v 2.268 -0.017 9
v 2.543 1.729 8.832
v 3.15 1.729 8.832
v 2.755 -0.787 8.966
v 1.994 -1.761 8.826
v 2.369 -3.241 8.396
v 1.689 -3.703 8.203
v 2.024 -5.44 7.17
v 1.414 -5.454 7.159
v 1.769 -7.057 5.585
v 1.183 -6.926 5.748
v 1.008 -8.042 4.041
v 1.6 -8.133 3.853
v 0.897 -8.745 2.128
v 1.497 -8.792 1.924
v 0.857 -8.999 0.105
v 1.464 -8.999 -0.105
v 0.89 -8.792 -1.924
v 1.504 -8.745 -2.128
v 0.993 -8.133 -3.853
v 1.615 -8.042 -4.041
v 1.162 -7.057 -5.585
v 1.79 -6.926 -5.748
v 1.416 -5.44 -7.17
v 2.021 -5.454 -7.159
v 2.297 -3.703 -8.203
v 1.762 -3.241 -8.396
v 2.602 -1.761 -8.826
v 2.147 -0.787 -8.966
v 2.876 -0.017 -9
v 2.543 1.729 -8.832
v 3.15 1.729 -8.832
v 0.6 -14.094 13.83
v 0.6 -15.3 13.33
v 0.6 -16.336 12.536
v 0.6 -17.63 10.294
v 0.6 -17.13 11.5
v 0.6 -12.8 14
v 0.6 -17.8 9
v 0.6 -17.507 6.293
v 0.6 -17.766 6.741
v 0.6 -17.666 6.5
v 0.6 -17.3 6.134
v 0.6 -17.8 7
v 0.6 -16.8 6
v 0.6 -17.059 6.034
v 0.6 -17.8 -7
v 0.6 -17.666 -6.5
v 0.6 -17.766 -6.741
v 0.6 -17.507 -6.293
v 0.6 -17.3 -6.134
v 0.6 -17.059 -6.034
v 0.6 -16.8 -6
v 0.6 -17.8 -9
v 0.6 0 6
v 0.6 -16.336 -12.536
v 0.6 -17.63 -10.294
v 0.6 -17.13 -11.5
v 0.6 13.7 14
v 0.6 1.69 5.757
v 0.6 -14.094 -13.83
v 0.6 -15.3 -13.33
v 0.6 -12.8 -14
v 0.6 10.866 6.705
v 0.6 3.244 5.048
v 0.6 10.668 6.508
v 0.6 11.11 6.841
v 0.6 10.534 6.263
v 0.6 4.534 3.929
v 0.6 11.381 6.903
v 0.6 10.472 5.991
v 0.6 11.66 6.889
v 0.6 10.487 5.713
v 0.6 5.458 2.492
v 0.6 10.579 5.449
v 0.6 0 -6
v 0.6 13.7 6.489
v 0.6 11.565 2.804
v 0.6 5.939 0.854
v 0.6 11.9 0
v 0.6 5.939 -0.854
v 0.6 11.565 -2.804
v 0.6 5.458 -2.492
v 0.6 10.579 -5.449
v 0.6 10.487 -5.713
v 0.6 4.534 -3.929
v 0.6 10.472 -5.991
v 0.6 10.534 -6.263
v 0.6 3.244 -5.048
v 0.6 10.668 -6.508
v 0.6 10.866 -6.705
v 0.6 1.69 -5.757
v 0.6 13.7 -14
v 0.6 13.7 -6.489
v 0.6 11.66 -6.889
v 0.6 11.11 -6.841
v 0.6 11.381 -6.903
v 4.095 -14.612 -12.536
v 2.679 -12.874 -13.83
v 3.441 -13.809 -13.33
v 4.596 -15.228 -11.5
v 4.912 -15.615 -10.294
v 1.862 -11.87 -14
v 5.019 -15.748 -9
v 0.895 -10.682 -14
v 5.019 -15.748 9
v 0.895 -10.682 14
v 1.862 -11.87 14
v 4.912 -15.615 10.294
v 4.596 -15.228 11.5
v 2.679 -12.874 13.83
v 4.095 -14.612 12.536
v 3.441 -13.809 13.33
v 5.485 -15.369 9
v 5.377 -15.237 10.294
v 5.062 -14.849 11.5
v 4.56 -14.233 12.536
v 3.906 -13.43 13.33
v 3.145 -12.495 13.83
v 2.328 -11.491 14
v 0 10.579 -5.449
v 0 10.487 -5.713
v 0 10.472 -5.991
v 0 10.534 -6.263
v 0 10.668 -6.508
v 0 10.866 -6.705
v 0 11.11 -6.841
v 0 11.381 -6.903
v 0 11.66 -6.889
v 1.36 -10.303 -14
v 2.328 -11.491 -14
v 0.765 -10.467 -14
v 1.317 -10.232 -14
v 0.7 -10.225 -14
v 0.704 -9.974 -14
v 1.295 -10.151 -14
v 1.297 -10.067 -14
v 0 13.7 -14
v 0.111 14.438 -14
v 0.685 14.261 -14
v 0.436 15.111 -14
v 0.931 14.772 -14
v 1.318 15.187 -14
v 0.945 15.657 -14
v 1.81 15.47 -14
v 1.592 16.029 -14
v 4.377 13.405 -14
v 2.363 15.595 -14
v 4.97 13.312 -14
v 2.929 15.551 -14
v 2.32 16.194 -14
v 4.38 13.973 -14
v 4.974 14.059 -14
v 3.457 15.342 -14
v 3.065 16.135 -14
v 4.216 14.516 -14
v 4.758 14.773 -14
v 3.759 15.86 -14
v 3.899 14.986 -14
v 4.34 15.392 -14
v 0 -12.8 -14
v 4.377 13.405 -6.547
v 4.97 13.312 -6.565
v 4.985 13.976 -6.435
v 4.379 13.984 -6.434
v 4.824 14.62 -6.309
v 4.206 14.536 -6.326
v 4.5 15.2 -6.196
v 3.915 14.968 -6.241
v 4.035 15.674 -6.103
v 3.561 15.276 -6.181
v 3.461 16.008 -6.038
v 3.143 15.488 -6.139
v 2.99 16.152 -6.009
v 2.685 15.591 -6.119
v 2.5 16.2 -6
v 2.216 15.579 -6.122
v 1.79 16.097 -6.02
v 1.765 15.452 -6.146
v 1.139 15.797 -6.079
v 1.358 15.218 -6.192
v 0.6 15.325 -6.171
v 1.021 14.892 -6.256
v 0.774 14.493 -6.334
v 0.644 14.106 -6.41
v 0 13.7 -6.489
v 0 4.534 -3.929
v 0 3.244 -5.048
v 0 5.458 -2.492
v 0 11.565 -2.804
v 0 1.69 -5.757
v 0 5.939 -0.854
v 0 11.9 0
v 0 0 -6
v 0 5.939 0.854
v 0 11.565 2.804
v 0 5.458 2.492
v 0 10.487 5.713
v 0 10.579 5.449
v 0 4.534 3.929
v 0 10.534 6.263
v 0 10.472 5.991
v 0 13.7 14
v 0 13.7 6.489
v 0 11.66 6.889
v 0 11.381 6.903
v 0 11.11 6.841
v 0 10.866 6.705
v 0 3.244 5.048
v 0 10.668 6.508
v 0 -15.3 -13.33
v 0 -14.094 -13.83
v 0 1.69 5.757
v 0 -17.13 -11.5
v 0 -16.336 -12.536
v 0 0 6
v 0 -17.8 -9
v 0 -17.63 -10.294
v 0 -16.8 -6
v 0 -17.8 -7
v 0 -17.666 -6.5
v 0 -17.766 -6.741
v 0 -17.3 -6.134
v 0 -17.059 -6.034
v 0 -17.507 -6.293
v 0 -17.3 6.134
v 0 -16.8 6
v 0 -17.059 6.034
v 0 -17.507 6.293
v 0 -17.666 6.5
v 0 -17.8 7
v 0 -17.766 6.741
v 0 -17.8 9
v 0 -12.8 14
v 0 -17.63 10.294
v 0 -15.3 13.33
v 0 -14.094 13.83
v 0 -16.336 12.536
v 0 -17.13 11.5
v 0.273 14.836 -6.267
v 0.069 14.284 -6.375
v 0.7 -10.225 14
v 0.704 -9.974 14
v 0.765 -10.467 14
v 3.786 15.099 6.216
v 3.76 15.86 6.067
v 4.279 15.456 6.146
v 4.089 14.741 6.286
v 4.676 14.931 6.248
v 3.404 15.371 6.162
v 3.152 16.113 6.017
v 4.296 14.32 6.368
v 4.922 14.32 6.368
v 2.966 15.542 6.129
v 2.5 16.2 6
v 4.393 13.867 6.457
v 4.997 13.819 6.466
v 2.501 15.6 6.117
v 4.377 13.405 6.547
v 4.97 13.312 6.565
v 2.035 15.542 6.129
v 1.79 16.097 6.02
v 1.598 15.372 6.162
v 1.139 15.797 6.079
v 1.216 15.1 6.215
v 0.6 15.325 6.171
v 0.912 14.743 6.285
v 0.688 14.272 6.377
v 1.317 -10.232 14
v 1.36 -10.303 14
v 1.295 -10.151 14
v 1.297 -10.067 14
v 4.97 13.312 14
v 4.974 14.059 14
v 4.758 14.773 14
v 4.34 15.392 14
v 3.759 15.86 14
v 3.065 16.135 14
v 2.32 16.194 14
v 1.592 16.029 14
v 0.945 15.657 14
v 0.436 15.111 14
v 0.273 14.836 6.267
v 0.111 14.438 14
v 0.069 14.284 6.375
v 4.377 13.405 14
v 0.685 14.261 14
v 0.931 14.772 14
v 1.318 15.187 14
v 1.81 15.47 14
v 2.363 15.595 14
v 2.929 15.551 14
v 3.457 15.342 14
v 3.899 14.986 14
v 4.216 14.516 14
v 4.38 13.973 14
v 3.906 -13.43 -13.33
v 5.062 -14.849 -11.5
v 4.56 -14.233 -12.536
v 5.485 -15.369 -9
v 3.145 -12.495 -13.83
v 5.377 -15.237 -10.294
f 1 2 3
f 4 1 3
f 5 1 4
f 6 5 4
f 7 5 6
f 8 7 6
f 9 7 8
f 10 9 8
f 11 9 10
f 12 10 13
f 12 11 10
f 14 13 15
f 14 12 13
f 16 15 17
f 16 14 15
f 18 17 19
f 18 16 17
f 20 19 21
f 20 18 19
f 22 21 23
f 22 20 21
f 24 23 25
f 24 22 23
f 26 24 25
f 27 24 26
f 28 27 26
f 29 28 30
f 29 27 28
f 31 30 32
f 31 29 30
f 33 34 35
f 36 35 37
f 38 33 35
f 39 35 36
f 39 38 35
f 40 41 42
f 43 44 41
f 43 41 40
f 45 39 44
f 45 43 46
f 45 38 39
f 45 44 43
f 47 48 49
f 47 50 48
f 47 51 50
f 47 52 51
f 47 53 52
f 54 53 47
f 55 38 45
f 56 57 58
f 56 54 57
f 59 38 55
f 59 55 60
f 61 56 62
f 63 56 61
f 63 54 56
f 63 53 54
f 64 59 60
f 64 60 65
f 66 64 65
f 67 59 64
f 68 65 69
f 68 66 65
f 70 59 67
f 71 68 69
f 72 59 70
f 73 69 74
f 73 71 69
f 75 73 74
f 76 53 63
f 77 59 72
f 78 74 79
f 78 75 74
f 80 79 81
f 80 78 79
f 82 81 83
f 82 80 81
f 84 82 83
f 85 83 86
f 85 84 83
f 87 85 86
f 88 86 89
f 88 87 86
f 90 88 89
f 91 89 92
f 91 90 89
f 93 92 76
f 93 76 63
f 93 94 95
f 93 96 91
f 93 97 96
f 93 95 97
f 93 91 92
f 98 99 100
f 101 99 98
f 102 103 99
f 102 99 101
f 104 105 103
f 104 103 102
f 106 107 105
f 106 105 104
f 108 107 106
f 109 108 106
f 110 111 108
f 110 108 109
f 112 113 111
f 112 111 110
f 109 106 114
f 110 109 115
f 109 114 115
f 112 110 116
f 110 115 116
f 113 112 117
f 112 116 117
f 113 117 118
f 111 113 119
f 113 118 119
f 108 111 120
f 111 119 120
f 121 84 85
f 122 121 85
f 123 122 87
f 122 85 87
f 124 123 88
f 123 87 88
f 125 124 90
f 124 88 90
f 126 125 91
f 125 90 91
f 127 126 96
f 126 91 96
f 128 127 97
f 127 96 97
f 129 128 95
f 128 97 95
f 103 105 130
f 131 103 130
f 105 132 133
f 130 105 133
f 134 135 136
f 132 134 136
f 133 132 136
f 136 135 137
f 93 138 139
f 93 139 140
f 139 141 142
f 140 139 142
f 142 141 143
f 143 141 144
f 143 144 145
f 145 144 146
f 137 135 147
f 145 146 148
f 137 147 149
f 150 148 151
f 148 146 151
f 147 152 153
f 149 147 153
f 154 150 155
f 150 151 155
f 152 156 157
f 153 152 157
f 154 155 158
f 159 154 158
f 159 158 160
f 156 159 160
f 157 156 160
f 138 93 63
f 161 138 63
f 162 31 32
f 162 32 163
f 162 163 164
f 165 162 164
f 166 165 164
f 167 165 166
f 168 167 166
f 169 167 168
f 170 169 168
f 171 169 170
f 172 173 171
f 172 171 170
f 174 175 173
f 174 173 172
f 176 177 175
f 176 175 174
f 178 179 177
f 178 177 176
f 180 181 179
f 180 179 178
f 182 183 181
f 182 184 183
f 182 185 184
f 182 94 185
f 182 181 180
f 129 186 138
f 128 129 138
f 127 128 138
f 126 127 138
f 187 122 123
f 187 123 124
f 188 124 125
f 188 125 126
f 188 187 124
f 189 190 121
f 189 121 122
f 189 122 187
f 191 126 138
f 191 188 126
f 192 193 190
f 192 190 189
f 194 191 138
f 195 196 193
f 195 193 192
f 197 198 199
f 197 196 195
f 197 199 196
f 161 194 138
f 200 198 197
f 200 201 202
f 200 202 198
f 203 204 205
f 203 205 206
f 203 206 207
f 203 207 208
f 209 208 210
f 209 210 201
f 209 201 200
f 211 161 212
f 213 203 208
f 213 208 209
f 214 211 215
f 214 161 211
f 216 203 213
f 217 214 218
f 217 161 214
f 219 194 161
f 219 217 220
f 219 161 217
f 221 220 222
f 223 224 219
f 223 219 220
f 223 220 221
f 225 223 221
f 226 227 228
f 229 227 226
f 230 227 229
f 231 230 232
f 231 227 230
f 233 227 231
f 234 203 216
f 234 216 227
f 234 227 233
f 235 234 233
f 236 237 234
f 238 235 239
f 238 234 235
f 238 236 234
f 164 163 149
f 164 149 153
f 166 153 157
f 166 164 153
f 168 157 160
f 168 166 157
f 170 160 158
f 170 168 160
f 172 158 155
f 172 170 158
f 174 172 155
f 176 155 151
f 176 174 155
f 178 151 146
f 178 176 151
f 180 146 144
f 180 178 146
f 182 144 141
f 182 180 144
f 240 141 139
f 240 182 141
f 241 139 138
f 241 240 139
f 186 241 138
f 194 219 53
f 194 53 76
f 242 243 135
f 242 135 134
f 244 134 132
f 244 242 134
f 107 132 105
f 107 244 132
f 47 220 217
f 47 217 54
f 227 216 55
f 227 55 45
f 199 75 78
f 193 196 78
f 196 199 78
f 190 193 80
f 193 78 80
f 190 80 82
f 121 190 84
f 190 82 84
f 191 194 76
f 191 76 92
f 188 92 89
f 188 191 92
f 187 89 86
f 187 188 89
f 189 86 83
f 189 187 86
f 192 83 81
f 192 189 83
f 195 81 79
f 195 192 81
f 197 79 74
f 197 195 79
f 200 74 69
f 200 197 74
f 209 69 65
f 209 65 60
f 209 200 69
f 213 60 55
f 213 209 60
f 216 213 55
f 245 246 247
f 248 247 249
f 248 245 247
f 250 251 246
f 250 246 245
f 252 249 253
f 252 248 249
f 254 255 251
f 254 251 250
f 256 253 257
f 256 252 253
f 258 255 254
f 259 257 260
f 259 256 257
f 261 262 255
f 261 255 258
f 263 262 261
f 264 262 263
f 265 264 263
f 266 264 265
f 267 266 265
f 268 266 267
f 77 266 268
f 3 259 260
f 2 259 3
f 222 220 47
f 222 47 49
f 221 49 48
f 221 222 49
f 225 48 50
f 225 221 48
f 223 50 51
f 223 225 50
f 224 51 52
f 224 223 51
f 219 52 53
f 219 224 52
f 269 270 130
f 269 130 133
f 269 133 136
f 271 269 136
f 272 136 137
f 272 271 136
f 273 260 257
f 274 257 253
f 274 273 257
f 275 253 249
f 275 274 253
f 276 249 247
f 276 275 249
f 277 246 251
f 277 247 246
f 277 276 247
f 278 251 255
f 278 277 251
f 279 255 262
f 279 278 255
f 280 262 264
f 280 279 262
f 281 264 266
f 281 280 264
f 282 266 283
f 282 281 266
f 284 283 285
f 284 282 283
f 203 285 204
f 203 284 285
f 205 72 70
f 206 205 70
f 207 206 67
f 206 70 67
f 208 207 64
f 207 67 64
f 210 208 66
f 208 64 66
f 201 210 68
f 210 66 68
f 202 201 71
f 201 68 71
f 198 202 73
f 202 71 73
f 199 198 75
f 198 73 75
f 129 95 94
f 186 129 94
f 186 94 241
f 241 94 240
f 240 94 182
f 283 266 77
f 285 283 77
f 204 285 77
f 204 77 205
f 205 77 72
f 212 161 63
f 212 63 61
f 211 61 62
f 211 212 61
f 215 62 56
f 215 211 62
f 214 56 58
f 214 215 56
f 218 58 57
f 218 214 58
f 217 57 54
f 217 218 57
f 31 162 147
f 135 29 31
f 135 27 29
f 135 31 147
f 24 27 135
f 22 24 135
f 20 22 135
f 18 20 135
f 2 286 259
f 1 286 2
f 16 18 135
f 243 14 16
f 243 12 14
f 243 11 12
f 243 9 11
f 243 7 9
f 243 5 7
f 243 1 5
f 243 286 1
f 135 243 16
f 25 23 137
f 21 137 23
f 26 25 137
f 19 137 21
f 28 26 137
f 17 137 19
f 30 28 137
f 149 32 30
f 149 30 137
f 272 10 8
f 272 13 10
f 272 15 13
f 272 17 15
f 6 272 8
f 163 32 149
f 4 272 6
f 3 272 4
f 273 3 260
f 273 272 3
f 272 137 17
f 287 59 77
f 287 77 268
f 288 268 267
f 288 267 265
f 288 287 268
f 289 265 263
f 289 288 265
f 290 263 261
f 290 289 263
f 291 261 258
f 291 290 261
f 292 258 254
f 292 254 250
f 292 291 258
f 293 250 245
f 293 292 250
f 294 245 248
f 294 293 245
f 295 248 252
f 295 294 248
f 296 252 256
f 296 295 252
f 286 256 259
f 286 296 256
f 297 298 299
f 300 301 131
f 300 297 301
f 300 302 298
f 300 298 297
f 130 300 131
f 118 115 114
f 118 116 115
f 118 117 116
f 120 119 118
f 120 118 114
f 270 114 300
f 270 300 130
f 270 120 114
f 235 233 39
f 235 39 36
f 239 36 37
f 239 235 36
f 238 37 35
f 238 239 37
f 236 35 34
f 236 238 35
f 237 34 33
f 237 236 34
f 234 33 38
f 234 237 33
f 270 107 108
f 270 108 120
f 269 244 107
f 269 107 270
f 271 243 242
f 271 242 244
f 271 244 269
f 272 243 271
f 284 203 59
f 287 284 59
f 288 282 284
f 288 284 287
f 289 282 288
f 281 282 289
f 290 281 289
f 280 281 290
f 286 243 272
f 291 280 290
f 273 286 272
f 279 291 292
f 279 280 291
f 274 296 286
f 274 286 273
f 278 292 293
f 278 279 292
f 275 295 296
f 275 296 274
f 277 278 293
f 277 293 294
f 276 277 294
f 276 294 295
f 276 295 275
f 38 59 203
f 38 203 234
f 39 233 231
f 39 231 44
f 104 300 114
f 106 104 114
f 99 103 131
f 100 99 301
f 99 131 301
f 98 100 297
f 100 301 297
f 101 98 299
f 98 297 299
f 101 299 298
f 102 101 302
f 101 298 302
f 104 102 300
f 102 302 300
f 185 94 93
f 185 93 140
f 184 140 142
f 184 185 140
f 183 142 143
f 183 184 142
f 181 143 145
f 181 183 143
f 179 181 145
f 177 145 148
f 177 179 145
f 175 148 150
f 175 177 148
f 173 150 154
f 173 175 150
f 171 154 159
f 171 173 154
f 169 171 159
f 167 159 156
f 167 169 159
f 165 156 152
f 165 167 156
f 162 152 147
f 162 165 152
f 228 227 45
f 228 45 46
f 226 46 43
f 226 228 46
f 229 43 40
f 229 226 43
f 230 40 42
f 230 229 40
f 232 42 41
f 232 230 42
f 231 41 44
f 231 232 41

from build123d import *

# Parameters (mm, degrees)
BOSS_EXTRUDE1_DEPTH      = 14
BOSS_EXTRUDE1_DEPTH_BACK = 14
CUT_EXTRUDE1_DEPTH       = 0.6
CUT_EXTRUDE2_DEPTH       = 5.4
CUT_EXTRUDE3_DEPTH       = 5.4
CUT_EXTRUDE4_DEPTH       = 0.6
CUT_EXTRUDE5_DEPTH       = 0.6
CUT_EXTRUDE6_DEPTH       = 0.6
CUT_EXTRUDE7_DEPTH       = 0.6
CUT_EXTRUDE8_DEPTH       = 1.2
CUT_EXTRUDE8_DEPTH_BACK  = 1.2


with BuildPart() as part:
    # Sketch1 → Boss-Extrude1 (new, two sides: drawn at the far end of the back side and taken through both)
    with BuildSketch(Plane.XY.offset(-BOSS_EXTRUDE1_DEPTH_BACK)):
        with BuildLine():
            Line((0, 13.7), (0, -17.8))
            Line((0, -17.8), (0.6, -17.8))
            Line((0.6, -17.8), (0.6, 13.7))
            ThreePointArc((0.6, 13.7), (2.647893792, 15.594235314), (4.376976238, 13.405109849))
            Line((4.376976238, 13.405109849), (0.703859087, -9.974286111))
            ThreePointArc((0.703859087, -9.974286111), (0.724075997, -10.348603801), (0.895029628, -10.682216319))
            Line((0.895029628, -10.682216319), (5.036277977, -15.76853009))
            Line((5.036277977, -15.76853009), (5.501560288, -15.389699824))
            Line((5.501560288, -15.389699824), (1.360311939, -10.303386053))
            ThreePointArc((1.360311939, -10.303386053), (1.303327395, -10.19218188), (1.296588425, -10.067409316))
            Line((1.296588425, -10.067409316), (4.969705577, 13.311986643))
            ThreePointArc((4.969705577, 13.311986643), (2.694597095, 16.192414887), (0, 13.7))
        make_face()
    extrude(amount=BOSS_EXTRUDE1_DEPTH + BOSS_EXTRUDE1_DEPTH_BACK)

    # Sketch2 → Cut-Extrude1 (cut)
    with BuildSketch(Plane(origin=(0, 0, 0), x_dir=(0, 0, -1), z_dir=(1, 0, 0))):
        with BuildLine():
            Line((-6, 0), (-6, -17.8))
            Line((-6, -17.8), (6, -17.8))
            Line((6, -17.8), (6, 0))
            ThreePointArc((6, 0), (0, 6), (-6, 0))
        make_face()
    extrude(amount=CUT_EXTRUDE1_DEPTH, mode=Mode.SUBTRACT)

    # Sketch3 → Cut-Extrude2 (cut)
    with BuildSketch(Plane(origin=(0.6, 0, 0), x_dir=(0, 0, -1), z_dir=(1, 0, 0))):
        with BuildLine():
            Line((8.832410113, 1.728736995), (6, 16.2))
            Line((6, 16.2), (-6, 16.2))
            Line((-6, 16.2), (-8.832410113, 1.728736995))
            ThreePointArc((-8.832410113, 1.728736995), (0, -9), (8.832410113, 1.728736995))
        make_face()
    extrude(amount=CUT_EXTRUDE2_DEPTH, mode=Mode.SUBTRACT)

    # Sketch4 → Cut-Extrude3 (cut)
    with BuildSketch(Plane(origin=(0.6, 0, 0), x_dir=(0, 0, -1), z_dir=(1, 0, 0))):
        with BuildLine():
            Line((6.88858316, 11.660078132), (6, 16.2))
            Line((6, 16.2), (-6, 16.2))
            Line((-6, 16.2), (-6.88858316, 11.660078132))
            ThreePointArc((-6.88858316, 11.660078132), (-6.507772079, 10.668422424), (-5.449281397, 10.579004313))
            ThreePointArc((-5.449281397, 10.579004313), (2.9e-08, 11.9), (5.449281448, 10.579004287))
            ThreePointArc((5.449281448, 10.579004287), (6.507772102, 10.668422441), (6.88858316, 11.660078132))
        make_face()
    extrude(amount=-CUT_EXTRUDE3_DEPTH, mode=Mode.SUBTRACT)

    # Sketch5 → Cut-Extrude4 (cut)
    with BuildSketch(Plane(origin=(0, 0, 0), x_dir=(0, 0, -1), z_dir=(1, 0, 0))):
        with BuildLine():
            Line((-14, -17.8), (-9, -17.8))
            ThreePointArc((-9, -17.8), (-12.535533906, -16.335533906), (-14, -12.8))
            Line((-14, -12.8), (-14, -17.8))
        make_face()
    extrude(amount=CUT_EXTRUDE4_DEPTH, mode=Mode.SUBTRACT)

    # Sketch6 → Cut-Extrude5 (cut)
    with BuildSketch(Plane(origin=(0, 0, 0), x_dir=(0, 0, -1), z_dir=(1, 0, 0))):
        with BuildLine():
            Line((9, -17.8), (14, -17.8))
            Line((14, -17.8), (14, -12.8))
            ThreePointArc((14, -12.8), (12.535533906, -16.335533906), (9, -17.8))
        make_face()
    extrude(amount=CUT_EXTRUDE5_DEPTH, mode=Mode.SUBTRACT)

    # Sketch7 → Cut-Extrude6 (cut)
    with BuildSketch(Plane(origin=(0, 0, 0), x_dir=(0, 0, -1), z_dir=(1, 0, 0))):
        with BuildLine():
            Line((6, -17.8), (7, -17.8))
            ThreePointArc((7, -17.8), (6.292893219, -17.507106781), (6, -16.8))
            Line((6, -16.8), (6, -17.8))
        make_face()
    extrude(amount=CUT_EXTRUDE6_DEPTH, mode=Mode.SUBTRACT)

    # Sketch8 → Cut-Extrude7 (cut)
    with BuildSketch(Plane(origin=(0, 0, 0), x_dir=(0, 0, -1), z_dir=(1, 0, 0))):
        with BuildLine():
            Line((-7, -17.8), (-6, -17.8))
            Line((-6, -17.8), (-6, -16.8))
            ThreePointArc((-6, -16.8), (-6.292893219, -17.507106781), (-7, -17.8))
        make_face()
    extrude(amount=CUT_EXTRUDE7_DEPTH, mode=Mode.SUBTRACT)

    # Sketch9 → Cut-Extrude8 (cut, two sides: drawn at the far end of the back side and taken through both)
    with BuildSketch(Plane(origin=(-4.226709045, -3.441362969, 0), x_dir=(0, 0, -1), z_dir=(0.7754705184321754, 0.6313837779374231, 0)).offset(-CUT_EXTRUDE8_DEPTH_BACK)):
        with BuildLine():
            Line((-14, -10.380851015), (-19, -10.380851015))
            Line((-19, -10.380851015), (-19, -20.380851015))
            Line((-19, -20.380851015), (19, -20.380851015))
            Line((19, -20.380851015), (19, -10.380851015))
            Line((19, -10.380851015), (14, -10.380851015))
            ThreePointArc((14, -10.380851015), (12.535533906, -13.916384921), (9, -15.380851015))
            Line((9, -15.380851015), (-9, -15.380851015))
            ThreePointArc((-9, -15.380851015), (-12.535533906, -13.916384921), (-14, -10.380851015))
        make_face()
    extrude(amount=CUT_EXTRUDE8_DEPTH + CUT_EXTRUDE8_DEPTH_BACK, mode=Mode.SUBTRACT)


solid = part.part
